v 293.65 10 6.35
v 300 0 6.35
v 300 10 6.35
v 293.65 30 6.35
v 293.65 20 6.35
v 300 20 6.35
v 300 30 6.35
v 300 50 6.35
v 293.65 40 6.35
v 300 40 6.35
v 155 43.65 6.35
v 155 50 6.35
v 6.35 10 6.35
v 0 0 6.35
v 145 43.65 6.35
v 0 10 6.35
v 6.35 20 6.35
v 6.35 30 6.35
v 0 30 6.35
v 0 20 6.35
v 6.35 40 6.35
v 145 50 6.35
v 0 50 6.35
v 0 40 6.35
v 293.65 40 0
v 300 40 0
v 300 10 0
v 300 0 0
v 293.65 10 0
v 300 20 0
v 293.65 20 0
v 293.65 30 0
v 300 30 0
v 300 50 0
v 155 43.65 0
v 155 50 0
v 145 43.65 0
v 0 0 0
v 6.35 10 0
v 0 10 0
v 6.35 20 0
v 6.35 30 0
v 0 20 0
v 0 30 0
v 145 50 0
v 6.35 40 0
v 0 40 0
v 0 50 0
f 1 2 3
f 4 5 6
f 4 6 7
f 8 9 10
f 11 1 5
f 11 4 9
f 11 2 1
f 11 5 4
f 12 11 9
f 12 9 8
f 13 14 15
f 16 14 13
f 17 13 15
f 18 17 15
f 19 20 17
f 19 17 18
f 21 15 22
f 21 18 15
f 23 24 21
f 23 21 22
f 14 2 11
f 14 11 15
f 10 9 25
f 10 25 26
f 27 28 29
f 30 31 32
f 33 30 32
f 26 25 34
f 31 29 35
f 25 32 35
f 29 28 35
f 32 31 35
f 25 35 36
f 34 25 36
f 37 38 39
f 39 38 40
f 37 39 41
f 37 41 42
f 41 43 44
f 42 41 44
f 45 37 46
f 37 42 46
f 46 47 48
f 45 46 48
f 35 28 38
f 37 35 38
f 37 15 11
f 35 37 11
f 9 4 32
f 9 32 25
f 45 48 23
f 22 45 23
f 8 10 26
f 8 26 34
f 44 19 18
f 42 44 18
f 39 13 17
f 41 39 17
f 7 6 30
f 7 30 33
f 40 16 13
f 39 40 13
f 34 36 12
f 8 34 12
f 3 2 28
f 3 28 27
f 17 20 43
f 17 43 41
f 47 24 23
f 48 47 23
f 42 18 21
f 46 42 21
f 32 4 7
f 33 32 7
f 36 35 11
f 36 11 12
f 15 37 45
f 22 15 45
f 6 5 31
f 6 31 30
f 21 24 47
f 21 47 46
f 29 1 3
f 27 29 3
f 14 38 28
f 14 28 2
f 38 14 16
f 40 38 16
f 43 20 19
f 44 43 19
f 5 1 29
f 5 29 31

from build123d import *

# Parameters (mm, degrees)
BOSS_EXTRUDE1_OUTLINE_W = 50
BOSS_EXTRUDE1_OUTLINE_H = 6.35
BOSS_EXTRUDE1_DEPTH     = 300
SKETCH1_W               = 10
SKETCH1_H               = 6.35
F_250_TOOTH_DEPTH       = 305.204409074
SKETCH5_W               = 6.35
SKETCH5_H               = 10
F_3T_CUT_DEPTH          = 305.204409074


# Read off the part's stored shape, not the designer's step: Boss-Extrude1
with BuildPart() as part:
    # Boss-Extrude1 outline → Boss-Extrude1 (new body)
    with BuildSketch(Plane.YZ):
        with Locations((25, 3.175)):
            Rectangle(BOSS_EXTRUDE1_OUTLINE_W, BOSS_EXTRUDE1_OUTLINE_H)
    extrude(amount=BOSS_EXTRUDE1_DEPTH)

    # Sketch1 → 250-tooth (cut, through all)
    with BuildSketch(Plane.XY.offset(6.35)):
        with Locations((150, 46.825)):
            Rectangle(SKETCH1_W, SKETCH1_H)
    extrude(amount=-F_250_TOOTH_DEPTH, mode=Mode.SUBTRACT)

    # Sketch5 → 3t_cut (cut, through all)
    with BuildSketch(Plane.XY.offset(6.35)):
        with Locations((3.175, 35)):
            Rectangle(SKETCH5_W, SKETCH5_H)
    f_3t_cut = extrude(amount=-F_3T_CUT_DEPTH, mode=Mode.SUBTRACT)

    # 3t_pattern: 3t_cut at 3 more places
    with Locations((0, -20, 0), (293.65, 0, 0), (293.65, -20, 0)):
        add(f_3t_cut, mode=Mode.SUBTRACT)


solid = part.part
